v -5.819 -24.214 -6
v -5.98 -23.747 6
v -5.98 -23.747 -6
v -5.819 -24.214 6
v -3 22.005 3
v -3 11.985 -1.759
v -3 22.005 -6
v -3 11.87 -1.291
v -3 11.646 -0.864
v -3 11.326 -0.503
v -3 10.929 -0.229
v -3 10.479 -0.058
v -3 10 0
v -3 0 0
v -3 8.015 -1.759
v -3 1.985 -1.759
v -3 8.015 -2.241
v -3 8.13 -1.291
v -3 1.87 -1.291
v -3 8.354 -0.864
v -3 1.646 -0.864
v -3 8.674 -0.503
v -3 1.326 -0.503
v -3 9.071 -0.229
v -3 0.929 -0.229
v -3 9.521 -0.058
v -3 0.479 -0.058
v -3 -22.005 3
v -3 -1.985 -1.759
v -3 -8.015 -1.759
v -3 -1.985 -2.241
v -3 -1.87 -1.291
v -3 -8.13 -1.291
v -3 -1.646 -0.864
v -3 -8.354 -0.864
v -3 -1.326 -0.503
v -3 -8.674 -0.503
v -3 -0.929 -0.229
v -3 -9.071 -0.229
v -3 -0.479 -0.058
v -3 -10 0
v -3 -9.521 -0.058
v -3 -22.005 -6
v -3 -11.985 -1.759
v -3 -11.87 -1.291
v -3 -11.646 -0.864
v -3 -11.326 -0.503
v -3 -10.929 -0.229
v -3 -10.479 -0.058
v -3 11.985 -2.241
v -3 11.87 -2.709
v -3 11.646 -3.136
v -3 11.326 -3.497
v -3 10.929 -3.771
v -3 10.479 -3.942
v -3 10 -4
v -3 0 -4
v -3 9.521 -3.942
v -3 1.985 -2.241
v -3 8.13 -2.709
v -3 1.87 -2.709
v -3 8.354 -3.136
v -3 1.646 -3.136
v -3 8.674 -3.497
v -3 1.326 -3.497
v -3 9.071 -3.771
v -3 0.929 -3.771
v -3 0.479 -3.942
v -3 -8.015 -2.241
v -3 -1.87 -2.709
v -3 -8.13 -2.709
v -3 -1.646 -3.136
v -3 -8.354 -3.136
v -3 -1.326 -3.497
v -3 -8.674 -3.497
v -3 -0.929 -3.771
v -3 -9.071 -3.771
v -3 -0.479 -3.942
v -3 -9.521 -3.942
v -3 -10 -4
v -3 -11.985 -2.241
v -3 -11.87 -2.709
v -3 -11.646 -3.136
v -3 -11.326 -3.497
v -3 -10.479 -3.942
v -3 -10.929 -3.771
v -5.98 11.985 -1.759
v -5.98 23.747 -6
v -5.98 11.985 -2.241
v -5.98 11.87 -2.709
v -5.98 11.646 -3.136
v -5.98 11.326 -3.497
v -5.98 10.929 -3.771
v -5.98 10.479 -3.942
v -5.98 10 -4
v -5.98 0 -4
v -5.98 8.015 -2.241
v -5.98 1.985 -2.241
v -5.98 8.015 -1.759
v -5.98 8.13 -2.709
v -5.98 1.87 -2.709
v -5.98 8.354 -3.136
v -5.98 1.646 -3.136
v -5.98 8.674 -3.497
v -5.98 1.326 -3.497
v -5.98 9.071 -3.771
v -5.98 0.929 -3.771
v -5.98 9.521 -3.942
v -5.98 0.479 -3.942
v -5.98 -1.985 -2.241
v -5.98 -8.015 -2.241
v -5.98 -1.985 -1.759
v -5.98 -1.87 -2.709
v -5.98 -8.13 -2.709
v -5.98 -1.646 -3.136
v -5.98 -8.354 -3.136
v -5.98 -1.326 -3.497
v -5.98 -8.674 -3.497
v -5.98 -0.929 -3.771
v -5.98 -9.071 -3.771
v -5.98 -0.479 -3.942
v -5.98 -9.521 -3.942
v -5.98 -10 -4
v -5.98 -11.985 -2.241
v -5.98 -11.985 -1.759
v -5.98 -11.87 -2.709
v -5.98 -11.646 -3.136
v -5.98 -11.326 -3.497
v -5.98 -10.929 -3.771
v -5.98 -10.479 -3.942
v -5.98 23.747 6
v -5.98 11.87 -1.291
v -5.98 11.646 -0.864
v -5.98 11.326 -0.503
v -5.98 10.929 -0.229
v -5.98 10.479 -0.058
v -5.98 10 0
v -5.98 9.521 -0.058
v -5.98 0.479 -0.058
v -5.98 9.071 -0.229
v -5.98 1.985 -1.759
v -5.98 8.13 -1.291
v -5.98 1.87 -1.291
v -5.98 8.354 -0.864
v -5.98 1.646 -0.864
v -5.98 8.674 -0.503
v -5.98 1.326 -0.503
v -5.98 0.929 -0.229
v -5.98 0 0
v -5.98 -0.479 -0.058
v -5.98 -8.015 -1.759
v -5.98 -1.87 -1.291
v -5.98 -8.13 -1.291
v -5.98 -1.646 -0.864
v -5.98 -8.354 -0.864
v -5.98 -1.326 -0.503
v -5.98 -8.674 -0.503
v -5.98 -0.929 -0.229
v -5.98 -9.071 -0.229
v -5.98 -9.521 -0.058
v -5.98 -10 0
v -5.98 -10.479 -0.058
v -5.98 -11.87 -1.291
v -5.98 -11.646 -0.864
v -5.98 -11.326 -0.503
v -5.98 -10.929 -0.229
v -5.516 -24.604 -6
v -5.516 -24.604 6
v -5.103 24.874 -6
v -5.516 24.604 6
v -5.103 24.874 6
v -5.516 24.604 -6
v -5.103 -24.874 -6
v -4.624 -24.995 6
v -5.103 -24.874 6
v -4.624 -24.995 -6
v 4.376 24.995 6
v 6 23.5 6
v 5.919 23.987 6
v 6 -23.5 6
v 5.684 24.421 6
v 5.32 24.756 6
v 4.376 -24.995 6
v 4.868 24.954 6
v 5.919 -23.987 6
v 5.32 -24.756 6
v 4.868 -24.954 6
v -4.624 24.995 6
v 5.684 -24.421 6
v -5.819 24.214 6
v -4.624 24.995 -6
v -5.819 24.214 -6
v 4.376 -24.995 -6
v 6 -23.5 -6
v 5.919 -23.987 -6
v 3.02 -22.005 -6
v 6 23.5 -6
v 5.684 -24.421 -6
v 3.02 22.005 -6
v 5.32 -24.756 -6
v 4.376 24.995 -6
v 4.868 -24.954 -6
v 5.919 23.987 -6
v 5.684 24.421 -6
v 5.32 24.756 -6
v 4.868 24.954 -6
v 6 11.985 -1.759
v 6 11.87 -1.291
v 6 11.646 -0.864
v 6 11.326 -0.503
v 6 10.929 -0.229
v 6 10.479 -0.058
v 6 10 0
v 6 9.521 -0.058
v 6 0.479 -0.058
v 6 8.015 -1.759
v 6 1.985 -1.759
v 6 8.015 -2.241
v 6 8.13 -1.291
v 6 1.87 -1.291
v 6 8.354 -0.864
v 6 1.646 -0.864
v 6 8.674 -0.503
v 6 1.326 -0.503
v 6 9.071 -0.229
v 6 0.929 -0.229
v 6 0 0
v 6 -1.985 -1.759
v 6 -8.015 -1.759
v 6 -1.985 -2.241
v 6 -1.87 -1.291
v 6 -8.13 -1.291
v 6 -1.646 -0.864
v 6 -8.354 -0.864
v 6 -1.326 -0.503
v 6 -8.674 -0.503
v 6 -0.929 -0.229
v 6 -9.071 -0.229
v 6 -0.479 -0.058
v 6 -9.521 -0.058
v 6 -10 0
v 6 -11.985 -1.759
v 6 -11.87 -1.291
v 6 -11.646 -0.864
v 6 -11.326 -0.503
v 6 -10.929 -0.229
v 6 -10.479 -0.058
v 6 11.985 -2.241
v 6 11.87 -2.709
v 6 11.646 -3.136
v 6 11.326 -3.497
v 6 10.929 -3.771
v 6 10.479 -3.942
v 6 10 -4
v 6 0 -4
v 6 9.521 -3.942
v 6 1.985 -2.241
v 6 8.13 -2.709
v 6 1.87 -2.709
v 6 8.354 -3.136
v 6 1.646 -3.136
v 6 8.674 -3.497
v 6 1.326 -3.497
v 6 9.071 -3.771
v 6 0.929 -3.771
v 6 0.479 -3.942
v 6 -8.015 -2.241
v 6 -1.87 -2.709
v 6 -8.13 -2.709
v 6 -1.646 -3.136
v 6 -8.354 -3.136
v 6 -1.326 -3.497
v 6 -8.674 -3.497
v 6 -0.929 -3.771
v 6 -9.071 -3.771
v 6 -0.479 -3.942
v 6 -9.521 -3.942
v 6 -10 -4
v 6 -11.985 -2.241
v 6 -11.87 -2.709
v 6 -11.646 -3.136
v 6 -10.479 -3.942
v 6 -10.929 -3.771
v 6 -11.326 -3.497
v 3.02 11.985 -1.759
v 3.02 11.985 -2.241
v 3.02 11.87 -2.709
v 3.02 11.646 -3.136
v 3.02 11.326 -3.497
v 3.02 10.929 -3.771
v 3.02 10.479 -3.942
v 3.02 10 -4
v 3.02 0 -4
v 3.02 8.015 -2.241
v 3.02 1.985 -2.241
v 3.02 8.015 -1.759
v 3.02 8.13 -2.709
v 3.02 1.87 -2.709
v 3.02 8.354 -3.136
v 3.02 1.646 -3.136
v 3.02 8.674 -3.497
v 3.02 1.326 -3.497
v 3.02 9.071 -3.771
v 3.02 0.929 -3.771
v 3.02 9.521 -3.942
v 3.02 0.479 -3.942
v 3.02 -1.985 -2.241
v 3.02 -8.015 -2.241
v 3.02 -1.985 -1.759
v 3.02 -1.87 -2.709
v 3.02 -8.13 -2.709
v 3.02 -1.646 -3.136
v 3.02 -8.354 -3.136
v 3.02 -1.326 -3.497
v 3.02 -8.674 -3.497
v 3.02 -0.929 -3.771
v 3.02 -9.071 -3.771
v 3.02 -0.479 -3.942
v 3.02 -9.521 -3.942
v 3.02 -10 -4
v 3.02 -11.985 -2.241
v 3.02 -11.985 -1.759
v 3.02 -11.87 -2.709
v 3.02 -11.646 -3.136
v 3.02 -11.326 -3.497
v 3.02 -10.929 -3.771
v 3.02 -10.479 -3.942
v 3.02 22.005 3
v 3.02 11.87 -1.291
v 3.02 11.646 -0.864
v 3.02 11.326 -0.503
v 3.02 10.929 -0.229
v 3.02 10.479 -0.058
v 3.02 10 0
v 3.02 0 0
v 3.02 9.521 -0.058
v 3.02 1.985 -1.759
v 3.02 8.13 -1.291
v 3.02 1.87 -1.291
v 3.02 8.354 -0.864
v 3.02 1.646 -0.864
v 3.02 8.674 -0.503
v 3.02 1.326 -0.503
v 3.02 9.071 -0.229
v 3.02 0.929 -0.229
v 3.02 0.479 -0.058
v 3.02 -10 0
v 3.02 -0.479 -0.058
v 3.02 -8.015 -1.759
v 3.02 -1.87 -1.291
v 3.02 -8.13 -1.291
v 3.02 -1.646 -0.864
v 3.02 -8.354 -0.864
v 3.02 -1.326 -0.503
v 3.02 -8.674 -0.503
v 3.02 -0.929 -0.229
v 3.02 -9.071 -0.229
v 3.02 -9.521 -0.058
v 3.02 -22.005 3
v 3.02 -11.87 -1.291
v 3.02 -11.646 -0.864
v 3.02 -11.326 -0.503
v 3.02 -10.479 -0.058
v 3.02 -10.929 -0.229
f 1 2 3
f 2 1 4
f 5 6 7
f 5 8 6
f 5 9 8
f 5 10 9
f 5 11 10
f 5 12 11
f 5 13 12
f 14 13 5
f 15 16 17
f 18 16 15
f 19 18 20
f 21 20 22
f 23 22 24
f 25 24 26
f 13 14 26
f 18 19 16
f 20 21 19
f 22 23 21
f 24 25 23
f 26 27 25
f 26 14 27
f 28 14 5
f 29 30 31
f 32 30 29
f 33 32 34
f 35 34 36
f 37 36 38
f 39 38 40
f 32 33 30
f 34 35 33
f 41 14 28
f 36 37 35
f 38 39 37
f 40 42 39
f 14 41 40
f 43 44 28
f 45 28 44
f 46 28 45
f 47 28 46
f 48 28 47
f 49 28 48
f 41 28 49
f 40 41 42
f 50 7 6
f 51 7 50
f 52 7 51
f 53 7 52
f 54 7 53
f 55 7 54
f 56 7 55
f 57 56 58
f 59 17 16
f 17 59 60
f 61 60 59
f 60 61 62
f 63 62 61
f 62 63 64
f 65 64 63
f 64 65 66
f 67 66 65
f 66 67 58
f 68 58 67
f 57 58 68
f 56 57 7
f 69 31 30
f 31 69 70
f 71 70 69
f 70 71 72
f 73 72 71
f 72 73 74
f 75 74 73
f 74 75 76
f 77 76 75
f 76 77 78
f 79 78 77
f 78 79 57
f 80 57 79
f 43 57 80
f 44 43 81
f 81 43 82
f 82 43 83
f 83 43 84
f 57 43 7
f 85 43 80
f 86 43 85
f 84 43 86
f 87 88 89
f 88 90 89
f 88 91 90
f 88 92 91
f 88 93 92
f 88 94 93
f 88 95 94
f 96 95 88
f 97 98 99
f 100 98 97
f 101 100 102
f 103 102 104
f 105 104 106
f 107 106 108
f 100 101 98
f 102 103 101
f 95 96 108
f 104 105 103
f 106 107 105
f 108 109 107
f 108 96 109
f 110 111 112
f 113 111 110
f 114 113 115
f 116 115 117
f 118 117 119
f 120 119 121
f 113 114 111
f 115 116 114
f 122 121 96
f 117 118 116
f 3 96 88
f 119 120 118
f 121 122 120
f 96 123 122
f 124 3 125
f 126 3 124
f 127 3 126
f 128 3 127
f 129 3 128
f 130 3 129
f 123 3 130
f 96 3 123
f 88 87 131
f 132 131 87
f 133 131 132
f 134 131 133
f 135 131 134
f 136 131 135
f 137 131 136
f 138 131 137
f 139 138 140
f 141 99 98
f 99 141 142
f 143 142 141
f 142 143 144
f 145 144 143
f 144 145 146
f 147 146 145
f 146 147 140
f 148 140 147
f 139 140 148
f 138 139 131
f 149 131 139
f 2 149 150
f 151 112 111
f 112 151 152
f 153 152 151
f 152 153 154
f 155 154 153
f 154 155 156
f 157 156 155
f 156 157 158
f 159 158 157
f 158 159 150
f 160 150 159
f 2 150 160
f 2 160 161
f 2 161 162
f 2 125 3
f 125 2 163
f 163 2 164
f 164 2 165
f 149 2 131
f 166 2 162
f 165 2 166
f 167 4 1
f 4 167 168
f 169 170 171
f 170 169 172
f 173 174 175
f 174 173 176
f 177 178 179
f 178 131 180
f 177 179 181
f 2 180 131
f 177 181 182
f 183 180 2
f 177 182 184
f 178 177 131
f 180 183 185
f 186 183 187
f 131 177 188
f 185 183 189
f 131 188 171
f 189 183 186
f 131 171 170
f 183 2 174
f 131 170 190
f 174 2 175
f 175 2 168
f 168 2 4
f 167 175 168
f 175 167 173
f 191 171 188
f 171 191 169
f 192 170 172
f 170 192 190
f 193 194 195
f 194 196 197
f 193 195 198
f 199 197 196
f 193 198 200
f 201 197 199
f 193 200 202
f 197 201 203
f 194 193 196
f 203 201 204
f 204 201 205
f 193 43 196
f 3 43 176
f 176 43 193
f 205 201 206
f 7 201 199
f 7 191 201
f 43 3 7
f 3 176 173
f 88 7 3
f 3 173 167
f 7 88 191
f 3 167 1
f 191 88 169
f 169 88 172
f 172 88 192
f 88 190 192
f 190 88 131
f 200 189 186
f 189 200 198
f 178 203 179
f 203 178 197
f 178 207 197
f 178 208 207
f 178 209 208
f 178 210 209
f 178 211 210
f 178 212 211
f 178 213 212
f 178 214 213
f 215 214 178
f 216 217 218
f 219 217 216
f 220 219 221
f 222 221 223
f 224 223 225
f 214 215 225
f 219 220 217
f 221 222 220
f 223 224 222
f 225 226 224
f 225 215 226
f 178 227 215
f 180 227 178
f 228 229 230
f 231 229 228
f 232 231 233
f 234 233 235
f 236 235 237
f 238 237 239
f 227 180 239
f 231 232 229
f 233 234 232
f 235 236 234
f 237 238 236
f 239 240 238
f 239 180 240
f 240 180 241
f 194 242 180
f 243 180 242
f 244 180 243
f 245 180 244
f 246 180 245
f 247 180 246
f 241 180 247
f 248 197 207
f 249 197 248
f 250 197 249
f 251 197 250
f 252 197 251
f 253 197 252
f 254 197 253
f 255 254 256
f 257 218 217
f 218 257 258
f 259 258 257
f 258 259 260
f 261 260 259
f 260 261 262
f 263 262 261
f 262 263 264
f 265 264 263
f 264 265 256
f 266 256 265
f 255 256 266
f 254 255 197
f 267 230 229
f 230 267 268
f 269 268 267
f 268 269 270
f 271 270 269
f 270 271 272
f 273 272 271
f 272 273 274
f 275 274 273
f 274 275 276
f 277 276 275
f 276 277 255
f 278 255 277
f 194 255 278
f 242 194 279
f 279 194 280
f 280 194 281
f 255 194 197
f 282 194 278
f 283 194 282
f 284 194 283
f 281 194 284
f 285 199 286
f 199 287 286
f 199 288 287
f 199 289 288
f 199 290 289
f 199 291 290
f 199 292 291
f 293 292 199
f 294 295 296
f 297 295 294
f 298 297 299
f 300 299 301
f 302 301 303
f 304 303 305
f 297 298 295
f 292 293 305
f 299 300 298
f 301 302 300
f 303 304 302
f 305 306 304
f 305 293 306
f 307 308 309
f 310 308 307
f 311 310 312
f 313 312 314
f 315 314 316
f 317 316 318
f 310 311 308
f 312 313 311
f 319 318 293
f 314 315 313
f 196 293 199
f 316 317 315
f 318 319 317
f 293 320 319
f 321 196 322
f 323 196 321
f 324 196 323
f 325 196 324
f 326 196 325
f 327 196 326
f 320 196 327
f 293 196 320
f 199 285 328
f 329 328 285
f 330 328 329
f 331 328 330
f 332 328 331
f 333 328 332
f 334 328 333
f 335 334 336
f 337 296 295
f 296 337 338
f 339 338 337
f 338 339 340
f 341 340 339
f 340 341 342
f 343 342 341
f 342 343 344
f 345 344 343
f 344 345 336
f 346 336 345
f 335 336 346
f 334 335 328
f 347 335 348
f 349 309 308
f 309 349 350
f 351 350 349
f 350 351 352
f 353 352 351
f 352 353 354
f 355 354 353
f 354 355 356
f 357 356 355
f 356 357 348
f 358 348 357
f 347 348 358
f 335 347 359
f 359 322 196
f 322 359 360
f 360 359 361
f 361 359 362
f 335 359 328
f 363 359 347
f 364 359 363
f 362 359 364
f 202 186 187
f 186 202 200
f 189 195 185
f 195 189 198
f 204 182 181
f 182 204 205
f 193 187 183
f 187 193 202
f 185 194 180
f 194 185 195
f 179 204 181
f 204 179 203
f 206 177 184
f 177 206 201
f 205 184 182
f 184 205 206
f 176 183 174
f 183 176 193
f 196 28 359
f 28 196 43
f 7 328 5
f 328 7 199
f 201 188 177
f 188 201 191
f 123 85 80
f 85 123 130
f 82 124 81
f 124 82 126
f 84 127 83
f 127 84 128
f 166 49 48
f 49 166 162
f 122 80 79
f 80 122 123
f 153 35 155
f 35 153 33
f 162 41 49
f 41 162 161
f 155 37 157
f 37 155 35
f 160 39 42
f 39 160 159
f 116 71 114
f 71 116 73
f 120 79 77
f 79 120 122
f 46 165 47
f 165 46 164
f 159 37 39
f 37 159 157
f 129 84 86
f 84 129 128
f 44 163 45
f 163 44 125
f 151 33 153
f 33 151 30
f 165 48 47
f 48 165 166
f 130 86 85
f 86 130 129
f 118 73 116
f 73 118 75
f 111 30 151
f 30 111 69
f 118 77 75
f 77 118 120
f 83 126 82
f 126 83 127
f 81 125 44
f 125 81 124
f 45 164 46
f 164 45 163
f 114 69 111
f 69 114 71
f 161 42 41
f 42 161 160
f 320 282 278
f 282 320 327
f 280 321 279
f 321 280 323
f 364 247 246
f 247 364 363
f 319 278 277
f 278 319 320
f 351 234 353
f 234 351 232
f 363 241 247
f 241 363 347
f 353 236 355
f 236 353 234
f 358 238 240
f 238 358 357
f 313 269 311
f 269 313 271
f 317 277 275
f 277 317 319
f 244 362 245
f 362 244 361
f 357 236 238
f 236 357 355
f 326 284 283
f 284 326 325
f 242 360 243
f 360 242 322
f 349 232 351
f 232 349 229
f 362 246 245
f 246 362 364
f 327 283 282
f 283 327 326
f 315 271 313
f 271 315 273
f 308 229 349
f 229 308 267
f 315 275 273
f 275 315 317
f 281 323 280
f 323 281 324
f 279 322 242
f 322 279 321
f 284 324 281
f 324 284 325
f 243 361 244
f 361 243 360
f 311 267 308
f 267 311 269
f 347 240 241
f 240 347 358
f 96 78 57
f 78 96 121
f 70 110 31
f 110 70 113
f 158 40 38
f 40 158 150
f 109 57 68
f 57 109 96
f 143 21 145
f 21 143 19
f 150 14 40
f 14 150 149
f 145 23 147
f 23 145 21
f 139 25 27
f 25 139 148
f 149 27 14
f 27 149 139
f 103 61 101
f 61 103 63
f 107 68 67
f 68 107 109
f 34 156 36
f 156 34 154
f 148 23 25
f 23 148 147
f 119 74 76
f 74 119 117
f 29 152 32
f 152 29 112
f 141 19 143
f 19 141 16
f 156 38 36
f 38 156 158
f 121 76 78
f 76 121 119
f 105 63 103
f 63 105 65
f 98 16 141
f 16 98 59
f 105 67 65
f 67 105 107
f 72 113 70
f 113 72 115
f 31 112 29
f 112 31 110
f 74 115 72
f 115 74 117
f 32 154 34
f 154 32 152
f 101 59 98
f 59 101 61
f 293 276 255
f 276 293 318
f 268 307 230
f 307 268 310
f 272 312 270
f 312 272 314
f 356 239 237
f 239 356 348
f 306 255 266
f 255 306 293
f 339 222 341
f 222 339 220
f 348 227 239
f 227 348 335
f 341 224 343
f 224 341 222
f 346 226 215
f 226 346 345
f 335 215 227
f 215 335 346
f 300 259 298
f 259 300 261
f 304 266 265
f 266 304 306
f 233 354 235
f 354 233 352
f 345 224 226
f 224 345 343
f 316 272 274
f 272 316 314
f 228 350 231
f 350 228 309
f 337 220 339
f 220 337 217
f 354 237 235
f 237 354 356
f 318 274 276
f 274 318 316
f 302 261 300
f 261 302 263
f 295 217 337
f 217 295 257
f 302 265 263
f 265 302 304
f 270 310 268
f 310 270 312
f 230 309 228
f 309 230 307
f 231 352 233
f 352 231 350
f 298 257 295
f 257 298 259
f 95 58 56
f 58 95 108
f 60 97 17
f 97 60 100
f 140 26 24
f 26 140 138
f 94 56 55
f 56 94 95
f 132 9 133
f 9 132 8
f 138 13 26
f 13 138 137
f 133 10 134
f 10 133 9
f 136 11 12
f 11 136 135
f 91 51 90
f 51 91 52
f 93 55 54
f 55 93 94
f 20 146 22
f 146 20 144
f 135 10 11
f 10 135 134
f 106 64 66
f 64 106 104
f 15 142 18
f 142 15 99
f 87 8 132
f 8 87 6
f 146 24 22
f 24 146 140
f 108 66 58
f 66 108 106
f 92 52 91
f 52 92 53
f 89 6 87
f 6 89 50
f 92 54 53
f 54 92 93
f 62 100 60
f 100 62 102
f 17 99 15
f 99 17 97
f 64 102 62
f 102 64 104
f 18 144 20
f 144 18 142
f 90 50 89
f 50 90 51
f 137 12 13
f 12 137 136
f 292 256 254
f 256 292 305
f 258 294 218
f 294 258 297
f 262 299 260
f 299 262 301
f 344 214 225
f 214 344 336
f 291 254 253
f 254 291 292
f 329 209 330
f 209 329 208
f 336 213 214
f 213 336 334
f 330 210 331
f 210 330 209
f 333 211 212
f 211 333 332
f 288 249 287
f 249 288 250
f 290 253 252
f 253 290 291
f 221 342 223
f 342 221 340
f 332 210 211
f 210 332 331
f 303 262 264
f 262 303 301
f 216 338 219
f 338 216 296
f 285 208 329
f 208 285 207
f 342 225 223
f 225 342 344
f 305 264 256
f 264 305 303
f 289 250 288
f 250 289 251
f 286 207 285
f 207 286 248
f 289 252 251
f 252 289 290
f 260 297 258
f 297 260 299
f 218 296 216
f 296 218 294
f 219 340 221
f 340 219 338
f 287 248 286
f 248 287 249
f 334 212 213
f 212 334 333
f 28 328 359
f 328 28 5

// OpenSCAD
// A spacer block that offsets two things with hole raster
// Like a cage from tripod plate or something
// Probably should become a part of rig-htsized repo
$fa=1/1;
$fs=1/2;
module camera_spacer() {
  height=12;
  width=50;
  depth=12;
  wall=3;
  rounded=5;
  n_holes=3;
  hole_distance=10;
  d_bolt=4;
  d_nut=0;//8;
  nuts_through=true;
  bolts_offset=4;
  bissl=1/100;
  points=[for (i=[-1,1]) for (j=[-1,1]) [i*(height/2-wall/2),j*(width/2-wall/2)]];
  connections=[[0,1],[2,3],[2,0],[3,1]];//,[1,3],[2,0]];
  difference() {
    for (c=connections) hull() {
      translate(points[c[0]])cylinder (d=wall,h=depth,center=true);
      translate(points[c[1]])cylinder (d=wall,h=depth,center=true);
    }
  for (t=[-hole_distance*(n_holes-1)/2:hole_distance:hole_distance*(n_holes-1)/2])
    translate([0,t,bolts_offset-depth/2]) {
      translate([-height/2-bissl,0,0]) rotate([0,90,0])cylinder(d=d_bolt,h=wall+2*bissl);
      translate([-height/2-bissl+wall/2,0,0])rotate([90,0,90])cylinder(d=d_nut,h=wall+2*bissl,$fn=6);
      translate([height/2-wall-bissl,0,0])rotate([0,90,0])cylinder(d=d_bolt,h=wall+2*bissl);
      translate([height/2-wall-bissl-wall/2,0,0])rotate([90,0,90])cylinder(d=d_nut,h=wall+2*bissl,$fn=6);
      if(nuts_through)translate([-height/2-bissl+wall/2,0,0])rotate([90,0,90])cylinder(d=d_nut,h=height-wall,$fn=6);
      
    }
  }
  difference() {
    translate([-(height-wall)/2,-(width-wall)/2,depth/2-wall])cube([height-wall,width-wall,wall]);
    translate([-(height-4*wall)/2,-(width-4*wall)/2,-bissl+depth/2-wall])cube([height-4*wall,width-4*wall,wall+2*bissl]);
  }
}
camera_spacer();
